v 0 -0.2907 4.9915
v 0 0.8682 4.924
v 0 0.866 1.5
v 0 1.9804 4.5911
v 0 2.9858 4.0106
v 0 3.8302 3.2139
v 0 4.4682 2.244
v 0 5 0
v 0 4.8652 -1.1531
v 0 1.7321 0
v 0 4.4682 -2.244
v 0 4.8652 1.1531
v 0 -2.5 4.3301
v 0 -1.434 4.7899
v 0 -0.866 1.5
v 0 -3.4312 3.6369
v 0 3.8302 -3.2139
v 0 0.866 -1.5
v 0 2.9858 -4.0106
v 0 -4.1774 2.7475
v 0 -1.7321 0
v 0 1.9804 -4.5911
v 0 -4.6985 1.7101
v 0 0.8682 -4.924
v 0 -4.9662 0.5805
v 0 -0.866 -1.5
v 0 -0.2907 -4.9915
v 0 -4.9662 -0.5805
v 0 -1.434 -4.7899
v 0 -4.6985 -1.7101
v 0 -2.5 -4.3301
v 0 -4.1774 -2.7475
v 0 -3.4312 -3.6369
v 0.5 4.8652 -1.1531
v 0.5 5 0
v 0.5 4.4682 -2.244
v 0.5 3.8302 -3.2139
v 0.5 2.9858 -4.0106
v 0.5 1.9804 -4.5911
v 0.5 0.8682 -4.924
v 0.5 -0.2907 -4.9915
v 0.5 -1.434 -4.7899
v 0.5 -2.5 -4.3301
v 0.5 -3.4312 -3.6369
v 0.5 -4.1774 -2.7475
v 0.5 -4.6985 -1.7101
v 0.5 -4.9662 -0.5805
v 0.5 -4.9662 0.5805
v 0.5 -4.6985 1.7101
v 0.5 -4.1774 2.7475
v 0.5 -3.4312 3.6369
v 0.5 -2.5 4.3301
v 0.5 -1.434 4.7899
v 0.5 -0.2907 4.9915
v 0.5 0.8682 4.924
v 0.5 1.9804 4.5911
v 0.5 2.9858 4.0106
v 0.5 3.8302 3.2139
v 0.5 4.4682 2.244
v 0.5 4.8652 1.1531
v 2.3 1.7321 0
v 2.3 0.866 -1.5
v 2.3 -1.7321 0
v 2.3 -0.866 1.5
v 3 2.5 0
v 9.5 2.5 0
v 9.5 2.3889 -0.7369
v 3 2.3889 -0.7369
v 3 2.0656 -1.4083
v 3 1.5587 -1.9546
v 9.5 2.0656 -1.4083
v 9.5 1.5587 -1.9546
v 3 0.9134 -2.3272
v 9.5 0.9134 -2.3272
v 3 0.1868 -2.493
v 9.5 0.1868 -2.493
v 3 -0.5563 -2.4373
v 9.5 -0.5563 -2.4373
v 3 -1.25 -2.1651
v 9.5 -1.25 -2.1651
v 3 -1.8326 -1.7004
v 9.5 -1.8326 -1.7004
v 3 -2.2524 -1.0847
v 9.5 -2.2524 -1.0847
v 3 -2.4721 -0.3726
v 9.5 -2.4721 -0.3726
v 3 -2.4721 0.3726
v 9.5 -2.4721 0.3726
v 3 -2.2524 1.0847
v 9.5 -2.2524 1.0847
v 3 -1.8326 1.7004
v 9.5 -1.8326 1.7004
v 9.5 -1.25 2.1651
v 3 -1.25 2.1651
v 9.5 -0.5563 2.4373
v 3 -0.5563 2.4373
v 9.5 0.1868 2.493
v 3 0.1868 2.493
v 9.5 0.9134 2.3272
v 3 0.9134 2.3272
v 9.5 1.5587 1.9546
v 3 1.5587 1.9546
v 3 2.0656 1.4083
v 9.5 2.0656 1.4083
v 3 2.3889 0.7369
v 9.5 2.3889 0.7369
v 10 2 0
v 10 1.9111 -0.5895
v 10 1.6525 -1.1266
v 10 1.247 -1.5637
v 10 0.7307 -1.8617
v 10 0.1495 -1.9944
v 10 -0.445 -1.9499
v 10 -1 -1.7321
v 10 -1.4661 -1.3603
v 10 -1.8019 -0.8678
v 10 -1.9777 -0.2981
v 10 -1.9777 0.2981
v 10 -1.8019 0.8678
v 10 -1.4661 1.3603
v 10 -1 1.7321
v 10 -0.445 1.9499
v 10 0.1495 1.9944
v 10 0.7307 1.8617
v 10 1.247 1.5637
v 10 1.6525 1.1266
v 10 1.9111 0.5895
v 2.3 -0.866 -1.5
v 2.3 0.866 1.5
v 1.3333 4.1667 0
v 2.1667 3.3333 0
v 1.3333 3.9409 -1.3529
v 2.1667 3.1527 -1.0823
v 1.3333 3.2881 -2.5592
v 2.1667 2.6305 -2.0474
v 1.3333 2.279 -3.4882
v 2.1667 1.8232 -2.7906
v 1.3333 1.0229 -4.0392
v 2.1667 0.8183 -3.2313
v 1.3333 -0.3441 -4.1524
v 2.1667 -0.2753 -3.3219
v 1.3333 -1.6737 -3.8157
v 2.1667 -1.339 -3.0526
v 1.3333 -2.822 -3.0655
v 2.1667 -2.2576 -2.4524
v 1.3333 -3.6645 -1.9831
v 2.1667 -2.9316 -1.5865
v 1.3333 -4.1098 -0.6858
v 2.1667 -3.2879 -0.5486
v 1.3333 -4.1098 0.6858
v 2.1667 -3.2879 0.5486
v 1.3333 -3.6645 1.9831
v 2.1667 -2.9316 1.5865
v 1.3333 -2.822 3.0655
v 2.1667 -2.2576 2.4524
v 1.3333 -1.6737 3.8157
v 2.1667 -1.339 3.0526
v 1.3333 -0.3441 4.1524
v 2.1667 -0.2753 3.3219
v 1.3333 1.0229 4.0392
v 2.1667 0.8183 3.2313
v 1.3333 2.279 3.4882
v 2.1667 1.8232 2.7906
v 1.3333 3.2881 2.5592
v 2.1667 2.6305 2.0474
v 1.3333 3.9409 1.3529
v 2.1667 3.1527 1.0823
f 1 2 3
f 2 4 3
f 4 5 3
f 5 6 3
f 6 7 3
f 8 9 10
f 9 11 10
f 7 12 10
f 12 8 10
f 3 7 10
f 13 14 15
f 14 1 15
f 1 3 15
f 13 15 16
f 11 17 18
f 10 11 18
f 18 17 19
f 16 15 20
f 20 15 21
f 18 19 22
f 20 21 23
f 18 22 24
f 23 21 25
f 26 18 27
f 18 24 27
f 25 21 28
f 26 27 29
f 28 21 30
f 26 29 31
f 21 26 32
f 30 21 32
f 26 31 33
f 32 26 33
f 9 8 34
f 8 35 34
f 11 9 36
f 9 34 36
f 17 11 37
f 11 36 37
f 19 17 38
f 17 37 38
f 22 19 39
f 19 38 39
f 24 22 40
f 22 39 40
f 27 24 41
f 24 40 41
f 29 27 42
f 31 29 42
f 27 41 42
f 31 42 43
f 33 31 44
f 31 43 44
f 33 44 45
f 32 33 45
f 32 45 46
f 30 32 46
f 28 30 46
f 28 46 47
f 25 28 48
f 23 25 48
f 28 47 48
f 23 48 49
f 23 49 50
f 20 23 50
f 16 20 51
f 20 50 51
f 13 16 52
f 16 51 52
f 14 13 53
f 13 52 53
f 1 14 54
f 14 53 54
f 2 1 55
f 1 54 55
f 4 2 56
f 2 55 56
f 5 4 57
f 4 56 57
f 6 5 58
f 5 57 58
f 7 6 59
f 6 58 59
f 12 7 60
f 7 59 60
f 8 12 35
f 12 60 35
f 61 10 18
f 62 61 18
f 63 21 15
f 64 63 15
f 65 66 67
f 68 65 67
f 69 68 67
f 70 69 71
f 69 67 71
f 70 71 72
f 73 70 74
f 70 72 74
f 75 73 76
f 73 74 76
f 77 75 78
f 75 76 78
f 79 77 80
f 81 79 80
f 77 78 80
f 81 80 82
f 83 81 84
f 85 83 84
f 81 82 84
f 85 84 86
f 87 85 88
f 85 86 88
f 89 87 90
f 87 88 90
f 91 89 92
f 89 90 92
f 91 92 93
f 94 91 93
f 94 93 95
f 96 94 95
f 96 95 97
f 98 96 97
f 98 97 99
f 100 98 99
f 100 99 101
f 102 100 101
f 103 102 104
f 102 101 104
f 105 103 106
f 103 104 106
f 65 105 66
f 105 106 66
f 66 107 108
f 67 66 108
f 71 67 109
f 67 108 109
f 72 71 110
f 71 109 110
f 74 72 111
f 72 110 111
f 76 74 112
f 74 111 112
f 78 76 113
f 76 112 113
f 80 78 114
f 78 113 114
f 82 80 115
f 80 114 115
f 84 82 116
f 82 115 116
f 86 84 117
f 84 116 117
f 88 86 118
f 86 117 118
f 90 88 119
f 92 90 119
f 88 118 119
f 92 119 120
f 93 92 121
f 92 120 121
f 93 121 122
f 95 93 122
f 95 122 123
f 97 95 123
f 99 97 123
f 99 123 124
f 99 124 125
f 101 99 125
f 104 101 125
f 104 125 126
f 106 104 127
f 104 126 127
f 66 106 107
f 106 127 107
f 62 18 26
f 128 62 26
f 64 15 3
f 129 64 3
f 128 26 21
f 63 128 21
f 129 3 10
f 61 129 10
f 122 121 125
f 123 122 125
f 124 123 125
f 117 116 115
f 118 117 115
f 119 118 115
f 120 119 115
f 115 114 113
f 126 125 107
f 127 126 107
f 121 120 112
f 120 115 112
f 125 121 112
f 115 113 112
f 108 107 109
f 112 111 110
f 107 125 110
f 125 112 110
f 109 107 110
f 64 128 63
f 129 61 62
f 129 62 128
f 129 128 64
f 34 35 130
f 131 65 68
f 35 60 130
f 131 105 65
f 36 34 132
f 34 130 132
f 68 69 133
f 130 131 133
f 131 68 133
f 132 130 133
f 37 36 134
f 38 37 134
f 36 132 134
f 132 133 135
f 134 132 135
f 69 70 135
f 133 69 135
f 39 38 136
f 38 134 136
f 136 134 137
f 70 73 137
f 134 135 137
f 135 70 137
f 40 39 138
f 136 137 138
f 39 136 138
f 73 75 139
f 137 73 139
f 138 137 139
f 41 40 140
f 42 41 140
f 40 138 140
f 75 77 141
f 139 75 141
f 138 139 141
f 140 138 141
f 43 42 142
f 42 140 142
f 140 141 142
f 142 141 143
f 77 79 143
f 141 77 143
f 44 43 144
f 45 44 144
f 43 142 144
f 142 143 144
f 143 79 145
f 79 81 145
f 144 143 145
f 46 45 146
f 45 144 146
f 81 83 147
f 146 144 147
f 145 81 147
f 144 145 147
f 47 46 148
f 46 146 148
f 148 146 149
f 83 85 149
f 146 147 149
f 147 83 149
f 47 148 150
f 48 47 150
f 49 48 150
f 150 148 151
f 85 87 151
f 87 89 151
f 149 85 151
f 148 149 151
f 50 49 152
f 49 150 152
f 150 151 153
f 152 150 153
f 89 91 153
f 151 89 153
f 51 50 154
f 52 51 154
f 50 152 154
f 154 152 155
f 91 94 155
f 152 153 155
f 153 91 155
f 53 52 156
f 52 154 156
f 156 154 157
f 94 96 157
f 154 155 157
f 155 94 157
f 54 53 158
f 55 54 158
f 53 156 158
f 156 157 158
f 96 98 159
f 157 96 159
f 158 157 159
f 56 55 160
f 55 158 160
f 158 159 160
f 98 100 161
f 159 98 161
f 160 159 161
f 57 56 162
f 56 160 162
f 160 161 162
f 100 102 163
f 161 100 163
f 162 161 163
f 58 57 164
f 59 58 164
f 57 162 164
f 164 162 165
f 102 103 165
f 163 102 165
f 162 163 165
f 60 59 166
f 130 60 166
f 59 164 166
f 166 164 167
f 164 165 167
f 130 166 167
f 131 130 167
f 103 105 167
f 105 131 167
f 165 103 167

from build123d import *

# Parameters (mm, degrees)
CHANFREIN1_SIZE         = 0.5
ENL_V_MAT_EXTRU_1_DEPTH = 2.3


with BuildPart() as part:
    # Esquisse1 → Révolution1 (revolve)
    with BuildSketch(Plane.XY):
        Polygon((0, 0), (0, 5), (0.5, 5), (3, 2.5), (10, 2.5), (10, 0), align=None)
    revolve(axis=Axis((10, 0, 0), (-1, 0, 0)))

    # Chanfrein1
    chanfrein1_edges = [part.edges().sort_by_distance(p)[0] for p in [
        (10, -2.5, 0),
    ]]
    chamfer(chanfrein1_edges, length=CHANFREIN1_SIZE)

    # Esquisse2 → Enlèv. mat.-Extru.1 (cut)
    with BuildSketch(Plane.ZY):
        Polygon((0, 1.732050808), (-1.5, 0.866025404), (-1.5, -0.866025404), (0, -1.732050808), (1.5, -0.866025404), (1.5, 0.866025404), align=None)
    extrude(amount=-ENL_V_MAT_EXTRU_1_DEPTH, mode=Mode.SUBTRACT)


solid = part.part
